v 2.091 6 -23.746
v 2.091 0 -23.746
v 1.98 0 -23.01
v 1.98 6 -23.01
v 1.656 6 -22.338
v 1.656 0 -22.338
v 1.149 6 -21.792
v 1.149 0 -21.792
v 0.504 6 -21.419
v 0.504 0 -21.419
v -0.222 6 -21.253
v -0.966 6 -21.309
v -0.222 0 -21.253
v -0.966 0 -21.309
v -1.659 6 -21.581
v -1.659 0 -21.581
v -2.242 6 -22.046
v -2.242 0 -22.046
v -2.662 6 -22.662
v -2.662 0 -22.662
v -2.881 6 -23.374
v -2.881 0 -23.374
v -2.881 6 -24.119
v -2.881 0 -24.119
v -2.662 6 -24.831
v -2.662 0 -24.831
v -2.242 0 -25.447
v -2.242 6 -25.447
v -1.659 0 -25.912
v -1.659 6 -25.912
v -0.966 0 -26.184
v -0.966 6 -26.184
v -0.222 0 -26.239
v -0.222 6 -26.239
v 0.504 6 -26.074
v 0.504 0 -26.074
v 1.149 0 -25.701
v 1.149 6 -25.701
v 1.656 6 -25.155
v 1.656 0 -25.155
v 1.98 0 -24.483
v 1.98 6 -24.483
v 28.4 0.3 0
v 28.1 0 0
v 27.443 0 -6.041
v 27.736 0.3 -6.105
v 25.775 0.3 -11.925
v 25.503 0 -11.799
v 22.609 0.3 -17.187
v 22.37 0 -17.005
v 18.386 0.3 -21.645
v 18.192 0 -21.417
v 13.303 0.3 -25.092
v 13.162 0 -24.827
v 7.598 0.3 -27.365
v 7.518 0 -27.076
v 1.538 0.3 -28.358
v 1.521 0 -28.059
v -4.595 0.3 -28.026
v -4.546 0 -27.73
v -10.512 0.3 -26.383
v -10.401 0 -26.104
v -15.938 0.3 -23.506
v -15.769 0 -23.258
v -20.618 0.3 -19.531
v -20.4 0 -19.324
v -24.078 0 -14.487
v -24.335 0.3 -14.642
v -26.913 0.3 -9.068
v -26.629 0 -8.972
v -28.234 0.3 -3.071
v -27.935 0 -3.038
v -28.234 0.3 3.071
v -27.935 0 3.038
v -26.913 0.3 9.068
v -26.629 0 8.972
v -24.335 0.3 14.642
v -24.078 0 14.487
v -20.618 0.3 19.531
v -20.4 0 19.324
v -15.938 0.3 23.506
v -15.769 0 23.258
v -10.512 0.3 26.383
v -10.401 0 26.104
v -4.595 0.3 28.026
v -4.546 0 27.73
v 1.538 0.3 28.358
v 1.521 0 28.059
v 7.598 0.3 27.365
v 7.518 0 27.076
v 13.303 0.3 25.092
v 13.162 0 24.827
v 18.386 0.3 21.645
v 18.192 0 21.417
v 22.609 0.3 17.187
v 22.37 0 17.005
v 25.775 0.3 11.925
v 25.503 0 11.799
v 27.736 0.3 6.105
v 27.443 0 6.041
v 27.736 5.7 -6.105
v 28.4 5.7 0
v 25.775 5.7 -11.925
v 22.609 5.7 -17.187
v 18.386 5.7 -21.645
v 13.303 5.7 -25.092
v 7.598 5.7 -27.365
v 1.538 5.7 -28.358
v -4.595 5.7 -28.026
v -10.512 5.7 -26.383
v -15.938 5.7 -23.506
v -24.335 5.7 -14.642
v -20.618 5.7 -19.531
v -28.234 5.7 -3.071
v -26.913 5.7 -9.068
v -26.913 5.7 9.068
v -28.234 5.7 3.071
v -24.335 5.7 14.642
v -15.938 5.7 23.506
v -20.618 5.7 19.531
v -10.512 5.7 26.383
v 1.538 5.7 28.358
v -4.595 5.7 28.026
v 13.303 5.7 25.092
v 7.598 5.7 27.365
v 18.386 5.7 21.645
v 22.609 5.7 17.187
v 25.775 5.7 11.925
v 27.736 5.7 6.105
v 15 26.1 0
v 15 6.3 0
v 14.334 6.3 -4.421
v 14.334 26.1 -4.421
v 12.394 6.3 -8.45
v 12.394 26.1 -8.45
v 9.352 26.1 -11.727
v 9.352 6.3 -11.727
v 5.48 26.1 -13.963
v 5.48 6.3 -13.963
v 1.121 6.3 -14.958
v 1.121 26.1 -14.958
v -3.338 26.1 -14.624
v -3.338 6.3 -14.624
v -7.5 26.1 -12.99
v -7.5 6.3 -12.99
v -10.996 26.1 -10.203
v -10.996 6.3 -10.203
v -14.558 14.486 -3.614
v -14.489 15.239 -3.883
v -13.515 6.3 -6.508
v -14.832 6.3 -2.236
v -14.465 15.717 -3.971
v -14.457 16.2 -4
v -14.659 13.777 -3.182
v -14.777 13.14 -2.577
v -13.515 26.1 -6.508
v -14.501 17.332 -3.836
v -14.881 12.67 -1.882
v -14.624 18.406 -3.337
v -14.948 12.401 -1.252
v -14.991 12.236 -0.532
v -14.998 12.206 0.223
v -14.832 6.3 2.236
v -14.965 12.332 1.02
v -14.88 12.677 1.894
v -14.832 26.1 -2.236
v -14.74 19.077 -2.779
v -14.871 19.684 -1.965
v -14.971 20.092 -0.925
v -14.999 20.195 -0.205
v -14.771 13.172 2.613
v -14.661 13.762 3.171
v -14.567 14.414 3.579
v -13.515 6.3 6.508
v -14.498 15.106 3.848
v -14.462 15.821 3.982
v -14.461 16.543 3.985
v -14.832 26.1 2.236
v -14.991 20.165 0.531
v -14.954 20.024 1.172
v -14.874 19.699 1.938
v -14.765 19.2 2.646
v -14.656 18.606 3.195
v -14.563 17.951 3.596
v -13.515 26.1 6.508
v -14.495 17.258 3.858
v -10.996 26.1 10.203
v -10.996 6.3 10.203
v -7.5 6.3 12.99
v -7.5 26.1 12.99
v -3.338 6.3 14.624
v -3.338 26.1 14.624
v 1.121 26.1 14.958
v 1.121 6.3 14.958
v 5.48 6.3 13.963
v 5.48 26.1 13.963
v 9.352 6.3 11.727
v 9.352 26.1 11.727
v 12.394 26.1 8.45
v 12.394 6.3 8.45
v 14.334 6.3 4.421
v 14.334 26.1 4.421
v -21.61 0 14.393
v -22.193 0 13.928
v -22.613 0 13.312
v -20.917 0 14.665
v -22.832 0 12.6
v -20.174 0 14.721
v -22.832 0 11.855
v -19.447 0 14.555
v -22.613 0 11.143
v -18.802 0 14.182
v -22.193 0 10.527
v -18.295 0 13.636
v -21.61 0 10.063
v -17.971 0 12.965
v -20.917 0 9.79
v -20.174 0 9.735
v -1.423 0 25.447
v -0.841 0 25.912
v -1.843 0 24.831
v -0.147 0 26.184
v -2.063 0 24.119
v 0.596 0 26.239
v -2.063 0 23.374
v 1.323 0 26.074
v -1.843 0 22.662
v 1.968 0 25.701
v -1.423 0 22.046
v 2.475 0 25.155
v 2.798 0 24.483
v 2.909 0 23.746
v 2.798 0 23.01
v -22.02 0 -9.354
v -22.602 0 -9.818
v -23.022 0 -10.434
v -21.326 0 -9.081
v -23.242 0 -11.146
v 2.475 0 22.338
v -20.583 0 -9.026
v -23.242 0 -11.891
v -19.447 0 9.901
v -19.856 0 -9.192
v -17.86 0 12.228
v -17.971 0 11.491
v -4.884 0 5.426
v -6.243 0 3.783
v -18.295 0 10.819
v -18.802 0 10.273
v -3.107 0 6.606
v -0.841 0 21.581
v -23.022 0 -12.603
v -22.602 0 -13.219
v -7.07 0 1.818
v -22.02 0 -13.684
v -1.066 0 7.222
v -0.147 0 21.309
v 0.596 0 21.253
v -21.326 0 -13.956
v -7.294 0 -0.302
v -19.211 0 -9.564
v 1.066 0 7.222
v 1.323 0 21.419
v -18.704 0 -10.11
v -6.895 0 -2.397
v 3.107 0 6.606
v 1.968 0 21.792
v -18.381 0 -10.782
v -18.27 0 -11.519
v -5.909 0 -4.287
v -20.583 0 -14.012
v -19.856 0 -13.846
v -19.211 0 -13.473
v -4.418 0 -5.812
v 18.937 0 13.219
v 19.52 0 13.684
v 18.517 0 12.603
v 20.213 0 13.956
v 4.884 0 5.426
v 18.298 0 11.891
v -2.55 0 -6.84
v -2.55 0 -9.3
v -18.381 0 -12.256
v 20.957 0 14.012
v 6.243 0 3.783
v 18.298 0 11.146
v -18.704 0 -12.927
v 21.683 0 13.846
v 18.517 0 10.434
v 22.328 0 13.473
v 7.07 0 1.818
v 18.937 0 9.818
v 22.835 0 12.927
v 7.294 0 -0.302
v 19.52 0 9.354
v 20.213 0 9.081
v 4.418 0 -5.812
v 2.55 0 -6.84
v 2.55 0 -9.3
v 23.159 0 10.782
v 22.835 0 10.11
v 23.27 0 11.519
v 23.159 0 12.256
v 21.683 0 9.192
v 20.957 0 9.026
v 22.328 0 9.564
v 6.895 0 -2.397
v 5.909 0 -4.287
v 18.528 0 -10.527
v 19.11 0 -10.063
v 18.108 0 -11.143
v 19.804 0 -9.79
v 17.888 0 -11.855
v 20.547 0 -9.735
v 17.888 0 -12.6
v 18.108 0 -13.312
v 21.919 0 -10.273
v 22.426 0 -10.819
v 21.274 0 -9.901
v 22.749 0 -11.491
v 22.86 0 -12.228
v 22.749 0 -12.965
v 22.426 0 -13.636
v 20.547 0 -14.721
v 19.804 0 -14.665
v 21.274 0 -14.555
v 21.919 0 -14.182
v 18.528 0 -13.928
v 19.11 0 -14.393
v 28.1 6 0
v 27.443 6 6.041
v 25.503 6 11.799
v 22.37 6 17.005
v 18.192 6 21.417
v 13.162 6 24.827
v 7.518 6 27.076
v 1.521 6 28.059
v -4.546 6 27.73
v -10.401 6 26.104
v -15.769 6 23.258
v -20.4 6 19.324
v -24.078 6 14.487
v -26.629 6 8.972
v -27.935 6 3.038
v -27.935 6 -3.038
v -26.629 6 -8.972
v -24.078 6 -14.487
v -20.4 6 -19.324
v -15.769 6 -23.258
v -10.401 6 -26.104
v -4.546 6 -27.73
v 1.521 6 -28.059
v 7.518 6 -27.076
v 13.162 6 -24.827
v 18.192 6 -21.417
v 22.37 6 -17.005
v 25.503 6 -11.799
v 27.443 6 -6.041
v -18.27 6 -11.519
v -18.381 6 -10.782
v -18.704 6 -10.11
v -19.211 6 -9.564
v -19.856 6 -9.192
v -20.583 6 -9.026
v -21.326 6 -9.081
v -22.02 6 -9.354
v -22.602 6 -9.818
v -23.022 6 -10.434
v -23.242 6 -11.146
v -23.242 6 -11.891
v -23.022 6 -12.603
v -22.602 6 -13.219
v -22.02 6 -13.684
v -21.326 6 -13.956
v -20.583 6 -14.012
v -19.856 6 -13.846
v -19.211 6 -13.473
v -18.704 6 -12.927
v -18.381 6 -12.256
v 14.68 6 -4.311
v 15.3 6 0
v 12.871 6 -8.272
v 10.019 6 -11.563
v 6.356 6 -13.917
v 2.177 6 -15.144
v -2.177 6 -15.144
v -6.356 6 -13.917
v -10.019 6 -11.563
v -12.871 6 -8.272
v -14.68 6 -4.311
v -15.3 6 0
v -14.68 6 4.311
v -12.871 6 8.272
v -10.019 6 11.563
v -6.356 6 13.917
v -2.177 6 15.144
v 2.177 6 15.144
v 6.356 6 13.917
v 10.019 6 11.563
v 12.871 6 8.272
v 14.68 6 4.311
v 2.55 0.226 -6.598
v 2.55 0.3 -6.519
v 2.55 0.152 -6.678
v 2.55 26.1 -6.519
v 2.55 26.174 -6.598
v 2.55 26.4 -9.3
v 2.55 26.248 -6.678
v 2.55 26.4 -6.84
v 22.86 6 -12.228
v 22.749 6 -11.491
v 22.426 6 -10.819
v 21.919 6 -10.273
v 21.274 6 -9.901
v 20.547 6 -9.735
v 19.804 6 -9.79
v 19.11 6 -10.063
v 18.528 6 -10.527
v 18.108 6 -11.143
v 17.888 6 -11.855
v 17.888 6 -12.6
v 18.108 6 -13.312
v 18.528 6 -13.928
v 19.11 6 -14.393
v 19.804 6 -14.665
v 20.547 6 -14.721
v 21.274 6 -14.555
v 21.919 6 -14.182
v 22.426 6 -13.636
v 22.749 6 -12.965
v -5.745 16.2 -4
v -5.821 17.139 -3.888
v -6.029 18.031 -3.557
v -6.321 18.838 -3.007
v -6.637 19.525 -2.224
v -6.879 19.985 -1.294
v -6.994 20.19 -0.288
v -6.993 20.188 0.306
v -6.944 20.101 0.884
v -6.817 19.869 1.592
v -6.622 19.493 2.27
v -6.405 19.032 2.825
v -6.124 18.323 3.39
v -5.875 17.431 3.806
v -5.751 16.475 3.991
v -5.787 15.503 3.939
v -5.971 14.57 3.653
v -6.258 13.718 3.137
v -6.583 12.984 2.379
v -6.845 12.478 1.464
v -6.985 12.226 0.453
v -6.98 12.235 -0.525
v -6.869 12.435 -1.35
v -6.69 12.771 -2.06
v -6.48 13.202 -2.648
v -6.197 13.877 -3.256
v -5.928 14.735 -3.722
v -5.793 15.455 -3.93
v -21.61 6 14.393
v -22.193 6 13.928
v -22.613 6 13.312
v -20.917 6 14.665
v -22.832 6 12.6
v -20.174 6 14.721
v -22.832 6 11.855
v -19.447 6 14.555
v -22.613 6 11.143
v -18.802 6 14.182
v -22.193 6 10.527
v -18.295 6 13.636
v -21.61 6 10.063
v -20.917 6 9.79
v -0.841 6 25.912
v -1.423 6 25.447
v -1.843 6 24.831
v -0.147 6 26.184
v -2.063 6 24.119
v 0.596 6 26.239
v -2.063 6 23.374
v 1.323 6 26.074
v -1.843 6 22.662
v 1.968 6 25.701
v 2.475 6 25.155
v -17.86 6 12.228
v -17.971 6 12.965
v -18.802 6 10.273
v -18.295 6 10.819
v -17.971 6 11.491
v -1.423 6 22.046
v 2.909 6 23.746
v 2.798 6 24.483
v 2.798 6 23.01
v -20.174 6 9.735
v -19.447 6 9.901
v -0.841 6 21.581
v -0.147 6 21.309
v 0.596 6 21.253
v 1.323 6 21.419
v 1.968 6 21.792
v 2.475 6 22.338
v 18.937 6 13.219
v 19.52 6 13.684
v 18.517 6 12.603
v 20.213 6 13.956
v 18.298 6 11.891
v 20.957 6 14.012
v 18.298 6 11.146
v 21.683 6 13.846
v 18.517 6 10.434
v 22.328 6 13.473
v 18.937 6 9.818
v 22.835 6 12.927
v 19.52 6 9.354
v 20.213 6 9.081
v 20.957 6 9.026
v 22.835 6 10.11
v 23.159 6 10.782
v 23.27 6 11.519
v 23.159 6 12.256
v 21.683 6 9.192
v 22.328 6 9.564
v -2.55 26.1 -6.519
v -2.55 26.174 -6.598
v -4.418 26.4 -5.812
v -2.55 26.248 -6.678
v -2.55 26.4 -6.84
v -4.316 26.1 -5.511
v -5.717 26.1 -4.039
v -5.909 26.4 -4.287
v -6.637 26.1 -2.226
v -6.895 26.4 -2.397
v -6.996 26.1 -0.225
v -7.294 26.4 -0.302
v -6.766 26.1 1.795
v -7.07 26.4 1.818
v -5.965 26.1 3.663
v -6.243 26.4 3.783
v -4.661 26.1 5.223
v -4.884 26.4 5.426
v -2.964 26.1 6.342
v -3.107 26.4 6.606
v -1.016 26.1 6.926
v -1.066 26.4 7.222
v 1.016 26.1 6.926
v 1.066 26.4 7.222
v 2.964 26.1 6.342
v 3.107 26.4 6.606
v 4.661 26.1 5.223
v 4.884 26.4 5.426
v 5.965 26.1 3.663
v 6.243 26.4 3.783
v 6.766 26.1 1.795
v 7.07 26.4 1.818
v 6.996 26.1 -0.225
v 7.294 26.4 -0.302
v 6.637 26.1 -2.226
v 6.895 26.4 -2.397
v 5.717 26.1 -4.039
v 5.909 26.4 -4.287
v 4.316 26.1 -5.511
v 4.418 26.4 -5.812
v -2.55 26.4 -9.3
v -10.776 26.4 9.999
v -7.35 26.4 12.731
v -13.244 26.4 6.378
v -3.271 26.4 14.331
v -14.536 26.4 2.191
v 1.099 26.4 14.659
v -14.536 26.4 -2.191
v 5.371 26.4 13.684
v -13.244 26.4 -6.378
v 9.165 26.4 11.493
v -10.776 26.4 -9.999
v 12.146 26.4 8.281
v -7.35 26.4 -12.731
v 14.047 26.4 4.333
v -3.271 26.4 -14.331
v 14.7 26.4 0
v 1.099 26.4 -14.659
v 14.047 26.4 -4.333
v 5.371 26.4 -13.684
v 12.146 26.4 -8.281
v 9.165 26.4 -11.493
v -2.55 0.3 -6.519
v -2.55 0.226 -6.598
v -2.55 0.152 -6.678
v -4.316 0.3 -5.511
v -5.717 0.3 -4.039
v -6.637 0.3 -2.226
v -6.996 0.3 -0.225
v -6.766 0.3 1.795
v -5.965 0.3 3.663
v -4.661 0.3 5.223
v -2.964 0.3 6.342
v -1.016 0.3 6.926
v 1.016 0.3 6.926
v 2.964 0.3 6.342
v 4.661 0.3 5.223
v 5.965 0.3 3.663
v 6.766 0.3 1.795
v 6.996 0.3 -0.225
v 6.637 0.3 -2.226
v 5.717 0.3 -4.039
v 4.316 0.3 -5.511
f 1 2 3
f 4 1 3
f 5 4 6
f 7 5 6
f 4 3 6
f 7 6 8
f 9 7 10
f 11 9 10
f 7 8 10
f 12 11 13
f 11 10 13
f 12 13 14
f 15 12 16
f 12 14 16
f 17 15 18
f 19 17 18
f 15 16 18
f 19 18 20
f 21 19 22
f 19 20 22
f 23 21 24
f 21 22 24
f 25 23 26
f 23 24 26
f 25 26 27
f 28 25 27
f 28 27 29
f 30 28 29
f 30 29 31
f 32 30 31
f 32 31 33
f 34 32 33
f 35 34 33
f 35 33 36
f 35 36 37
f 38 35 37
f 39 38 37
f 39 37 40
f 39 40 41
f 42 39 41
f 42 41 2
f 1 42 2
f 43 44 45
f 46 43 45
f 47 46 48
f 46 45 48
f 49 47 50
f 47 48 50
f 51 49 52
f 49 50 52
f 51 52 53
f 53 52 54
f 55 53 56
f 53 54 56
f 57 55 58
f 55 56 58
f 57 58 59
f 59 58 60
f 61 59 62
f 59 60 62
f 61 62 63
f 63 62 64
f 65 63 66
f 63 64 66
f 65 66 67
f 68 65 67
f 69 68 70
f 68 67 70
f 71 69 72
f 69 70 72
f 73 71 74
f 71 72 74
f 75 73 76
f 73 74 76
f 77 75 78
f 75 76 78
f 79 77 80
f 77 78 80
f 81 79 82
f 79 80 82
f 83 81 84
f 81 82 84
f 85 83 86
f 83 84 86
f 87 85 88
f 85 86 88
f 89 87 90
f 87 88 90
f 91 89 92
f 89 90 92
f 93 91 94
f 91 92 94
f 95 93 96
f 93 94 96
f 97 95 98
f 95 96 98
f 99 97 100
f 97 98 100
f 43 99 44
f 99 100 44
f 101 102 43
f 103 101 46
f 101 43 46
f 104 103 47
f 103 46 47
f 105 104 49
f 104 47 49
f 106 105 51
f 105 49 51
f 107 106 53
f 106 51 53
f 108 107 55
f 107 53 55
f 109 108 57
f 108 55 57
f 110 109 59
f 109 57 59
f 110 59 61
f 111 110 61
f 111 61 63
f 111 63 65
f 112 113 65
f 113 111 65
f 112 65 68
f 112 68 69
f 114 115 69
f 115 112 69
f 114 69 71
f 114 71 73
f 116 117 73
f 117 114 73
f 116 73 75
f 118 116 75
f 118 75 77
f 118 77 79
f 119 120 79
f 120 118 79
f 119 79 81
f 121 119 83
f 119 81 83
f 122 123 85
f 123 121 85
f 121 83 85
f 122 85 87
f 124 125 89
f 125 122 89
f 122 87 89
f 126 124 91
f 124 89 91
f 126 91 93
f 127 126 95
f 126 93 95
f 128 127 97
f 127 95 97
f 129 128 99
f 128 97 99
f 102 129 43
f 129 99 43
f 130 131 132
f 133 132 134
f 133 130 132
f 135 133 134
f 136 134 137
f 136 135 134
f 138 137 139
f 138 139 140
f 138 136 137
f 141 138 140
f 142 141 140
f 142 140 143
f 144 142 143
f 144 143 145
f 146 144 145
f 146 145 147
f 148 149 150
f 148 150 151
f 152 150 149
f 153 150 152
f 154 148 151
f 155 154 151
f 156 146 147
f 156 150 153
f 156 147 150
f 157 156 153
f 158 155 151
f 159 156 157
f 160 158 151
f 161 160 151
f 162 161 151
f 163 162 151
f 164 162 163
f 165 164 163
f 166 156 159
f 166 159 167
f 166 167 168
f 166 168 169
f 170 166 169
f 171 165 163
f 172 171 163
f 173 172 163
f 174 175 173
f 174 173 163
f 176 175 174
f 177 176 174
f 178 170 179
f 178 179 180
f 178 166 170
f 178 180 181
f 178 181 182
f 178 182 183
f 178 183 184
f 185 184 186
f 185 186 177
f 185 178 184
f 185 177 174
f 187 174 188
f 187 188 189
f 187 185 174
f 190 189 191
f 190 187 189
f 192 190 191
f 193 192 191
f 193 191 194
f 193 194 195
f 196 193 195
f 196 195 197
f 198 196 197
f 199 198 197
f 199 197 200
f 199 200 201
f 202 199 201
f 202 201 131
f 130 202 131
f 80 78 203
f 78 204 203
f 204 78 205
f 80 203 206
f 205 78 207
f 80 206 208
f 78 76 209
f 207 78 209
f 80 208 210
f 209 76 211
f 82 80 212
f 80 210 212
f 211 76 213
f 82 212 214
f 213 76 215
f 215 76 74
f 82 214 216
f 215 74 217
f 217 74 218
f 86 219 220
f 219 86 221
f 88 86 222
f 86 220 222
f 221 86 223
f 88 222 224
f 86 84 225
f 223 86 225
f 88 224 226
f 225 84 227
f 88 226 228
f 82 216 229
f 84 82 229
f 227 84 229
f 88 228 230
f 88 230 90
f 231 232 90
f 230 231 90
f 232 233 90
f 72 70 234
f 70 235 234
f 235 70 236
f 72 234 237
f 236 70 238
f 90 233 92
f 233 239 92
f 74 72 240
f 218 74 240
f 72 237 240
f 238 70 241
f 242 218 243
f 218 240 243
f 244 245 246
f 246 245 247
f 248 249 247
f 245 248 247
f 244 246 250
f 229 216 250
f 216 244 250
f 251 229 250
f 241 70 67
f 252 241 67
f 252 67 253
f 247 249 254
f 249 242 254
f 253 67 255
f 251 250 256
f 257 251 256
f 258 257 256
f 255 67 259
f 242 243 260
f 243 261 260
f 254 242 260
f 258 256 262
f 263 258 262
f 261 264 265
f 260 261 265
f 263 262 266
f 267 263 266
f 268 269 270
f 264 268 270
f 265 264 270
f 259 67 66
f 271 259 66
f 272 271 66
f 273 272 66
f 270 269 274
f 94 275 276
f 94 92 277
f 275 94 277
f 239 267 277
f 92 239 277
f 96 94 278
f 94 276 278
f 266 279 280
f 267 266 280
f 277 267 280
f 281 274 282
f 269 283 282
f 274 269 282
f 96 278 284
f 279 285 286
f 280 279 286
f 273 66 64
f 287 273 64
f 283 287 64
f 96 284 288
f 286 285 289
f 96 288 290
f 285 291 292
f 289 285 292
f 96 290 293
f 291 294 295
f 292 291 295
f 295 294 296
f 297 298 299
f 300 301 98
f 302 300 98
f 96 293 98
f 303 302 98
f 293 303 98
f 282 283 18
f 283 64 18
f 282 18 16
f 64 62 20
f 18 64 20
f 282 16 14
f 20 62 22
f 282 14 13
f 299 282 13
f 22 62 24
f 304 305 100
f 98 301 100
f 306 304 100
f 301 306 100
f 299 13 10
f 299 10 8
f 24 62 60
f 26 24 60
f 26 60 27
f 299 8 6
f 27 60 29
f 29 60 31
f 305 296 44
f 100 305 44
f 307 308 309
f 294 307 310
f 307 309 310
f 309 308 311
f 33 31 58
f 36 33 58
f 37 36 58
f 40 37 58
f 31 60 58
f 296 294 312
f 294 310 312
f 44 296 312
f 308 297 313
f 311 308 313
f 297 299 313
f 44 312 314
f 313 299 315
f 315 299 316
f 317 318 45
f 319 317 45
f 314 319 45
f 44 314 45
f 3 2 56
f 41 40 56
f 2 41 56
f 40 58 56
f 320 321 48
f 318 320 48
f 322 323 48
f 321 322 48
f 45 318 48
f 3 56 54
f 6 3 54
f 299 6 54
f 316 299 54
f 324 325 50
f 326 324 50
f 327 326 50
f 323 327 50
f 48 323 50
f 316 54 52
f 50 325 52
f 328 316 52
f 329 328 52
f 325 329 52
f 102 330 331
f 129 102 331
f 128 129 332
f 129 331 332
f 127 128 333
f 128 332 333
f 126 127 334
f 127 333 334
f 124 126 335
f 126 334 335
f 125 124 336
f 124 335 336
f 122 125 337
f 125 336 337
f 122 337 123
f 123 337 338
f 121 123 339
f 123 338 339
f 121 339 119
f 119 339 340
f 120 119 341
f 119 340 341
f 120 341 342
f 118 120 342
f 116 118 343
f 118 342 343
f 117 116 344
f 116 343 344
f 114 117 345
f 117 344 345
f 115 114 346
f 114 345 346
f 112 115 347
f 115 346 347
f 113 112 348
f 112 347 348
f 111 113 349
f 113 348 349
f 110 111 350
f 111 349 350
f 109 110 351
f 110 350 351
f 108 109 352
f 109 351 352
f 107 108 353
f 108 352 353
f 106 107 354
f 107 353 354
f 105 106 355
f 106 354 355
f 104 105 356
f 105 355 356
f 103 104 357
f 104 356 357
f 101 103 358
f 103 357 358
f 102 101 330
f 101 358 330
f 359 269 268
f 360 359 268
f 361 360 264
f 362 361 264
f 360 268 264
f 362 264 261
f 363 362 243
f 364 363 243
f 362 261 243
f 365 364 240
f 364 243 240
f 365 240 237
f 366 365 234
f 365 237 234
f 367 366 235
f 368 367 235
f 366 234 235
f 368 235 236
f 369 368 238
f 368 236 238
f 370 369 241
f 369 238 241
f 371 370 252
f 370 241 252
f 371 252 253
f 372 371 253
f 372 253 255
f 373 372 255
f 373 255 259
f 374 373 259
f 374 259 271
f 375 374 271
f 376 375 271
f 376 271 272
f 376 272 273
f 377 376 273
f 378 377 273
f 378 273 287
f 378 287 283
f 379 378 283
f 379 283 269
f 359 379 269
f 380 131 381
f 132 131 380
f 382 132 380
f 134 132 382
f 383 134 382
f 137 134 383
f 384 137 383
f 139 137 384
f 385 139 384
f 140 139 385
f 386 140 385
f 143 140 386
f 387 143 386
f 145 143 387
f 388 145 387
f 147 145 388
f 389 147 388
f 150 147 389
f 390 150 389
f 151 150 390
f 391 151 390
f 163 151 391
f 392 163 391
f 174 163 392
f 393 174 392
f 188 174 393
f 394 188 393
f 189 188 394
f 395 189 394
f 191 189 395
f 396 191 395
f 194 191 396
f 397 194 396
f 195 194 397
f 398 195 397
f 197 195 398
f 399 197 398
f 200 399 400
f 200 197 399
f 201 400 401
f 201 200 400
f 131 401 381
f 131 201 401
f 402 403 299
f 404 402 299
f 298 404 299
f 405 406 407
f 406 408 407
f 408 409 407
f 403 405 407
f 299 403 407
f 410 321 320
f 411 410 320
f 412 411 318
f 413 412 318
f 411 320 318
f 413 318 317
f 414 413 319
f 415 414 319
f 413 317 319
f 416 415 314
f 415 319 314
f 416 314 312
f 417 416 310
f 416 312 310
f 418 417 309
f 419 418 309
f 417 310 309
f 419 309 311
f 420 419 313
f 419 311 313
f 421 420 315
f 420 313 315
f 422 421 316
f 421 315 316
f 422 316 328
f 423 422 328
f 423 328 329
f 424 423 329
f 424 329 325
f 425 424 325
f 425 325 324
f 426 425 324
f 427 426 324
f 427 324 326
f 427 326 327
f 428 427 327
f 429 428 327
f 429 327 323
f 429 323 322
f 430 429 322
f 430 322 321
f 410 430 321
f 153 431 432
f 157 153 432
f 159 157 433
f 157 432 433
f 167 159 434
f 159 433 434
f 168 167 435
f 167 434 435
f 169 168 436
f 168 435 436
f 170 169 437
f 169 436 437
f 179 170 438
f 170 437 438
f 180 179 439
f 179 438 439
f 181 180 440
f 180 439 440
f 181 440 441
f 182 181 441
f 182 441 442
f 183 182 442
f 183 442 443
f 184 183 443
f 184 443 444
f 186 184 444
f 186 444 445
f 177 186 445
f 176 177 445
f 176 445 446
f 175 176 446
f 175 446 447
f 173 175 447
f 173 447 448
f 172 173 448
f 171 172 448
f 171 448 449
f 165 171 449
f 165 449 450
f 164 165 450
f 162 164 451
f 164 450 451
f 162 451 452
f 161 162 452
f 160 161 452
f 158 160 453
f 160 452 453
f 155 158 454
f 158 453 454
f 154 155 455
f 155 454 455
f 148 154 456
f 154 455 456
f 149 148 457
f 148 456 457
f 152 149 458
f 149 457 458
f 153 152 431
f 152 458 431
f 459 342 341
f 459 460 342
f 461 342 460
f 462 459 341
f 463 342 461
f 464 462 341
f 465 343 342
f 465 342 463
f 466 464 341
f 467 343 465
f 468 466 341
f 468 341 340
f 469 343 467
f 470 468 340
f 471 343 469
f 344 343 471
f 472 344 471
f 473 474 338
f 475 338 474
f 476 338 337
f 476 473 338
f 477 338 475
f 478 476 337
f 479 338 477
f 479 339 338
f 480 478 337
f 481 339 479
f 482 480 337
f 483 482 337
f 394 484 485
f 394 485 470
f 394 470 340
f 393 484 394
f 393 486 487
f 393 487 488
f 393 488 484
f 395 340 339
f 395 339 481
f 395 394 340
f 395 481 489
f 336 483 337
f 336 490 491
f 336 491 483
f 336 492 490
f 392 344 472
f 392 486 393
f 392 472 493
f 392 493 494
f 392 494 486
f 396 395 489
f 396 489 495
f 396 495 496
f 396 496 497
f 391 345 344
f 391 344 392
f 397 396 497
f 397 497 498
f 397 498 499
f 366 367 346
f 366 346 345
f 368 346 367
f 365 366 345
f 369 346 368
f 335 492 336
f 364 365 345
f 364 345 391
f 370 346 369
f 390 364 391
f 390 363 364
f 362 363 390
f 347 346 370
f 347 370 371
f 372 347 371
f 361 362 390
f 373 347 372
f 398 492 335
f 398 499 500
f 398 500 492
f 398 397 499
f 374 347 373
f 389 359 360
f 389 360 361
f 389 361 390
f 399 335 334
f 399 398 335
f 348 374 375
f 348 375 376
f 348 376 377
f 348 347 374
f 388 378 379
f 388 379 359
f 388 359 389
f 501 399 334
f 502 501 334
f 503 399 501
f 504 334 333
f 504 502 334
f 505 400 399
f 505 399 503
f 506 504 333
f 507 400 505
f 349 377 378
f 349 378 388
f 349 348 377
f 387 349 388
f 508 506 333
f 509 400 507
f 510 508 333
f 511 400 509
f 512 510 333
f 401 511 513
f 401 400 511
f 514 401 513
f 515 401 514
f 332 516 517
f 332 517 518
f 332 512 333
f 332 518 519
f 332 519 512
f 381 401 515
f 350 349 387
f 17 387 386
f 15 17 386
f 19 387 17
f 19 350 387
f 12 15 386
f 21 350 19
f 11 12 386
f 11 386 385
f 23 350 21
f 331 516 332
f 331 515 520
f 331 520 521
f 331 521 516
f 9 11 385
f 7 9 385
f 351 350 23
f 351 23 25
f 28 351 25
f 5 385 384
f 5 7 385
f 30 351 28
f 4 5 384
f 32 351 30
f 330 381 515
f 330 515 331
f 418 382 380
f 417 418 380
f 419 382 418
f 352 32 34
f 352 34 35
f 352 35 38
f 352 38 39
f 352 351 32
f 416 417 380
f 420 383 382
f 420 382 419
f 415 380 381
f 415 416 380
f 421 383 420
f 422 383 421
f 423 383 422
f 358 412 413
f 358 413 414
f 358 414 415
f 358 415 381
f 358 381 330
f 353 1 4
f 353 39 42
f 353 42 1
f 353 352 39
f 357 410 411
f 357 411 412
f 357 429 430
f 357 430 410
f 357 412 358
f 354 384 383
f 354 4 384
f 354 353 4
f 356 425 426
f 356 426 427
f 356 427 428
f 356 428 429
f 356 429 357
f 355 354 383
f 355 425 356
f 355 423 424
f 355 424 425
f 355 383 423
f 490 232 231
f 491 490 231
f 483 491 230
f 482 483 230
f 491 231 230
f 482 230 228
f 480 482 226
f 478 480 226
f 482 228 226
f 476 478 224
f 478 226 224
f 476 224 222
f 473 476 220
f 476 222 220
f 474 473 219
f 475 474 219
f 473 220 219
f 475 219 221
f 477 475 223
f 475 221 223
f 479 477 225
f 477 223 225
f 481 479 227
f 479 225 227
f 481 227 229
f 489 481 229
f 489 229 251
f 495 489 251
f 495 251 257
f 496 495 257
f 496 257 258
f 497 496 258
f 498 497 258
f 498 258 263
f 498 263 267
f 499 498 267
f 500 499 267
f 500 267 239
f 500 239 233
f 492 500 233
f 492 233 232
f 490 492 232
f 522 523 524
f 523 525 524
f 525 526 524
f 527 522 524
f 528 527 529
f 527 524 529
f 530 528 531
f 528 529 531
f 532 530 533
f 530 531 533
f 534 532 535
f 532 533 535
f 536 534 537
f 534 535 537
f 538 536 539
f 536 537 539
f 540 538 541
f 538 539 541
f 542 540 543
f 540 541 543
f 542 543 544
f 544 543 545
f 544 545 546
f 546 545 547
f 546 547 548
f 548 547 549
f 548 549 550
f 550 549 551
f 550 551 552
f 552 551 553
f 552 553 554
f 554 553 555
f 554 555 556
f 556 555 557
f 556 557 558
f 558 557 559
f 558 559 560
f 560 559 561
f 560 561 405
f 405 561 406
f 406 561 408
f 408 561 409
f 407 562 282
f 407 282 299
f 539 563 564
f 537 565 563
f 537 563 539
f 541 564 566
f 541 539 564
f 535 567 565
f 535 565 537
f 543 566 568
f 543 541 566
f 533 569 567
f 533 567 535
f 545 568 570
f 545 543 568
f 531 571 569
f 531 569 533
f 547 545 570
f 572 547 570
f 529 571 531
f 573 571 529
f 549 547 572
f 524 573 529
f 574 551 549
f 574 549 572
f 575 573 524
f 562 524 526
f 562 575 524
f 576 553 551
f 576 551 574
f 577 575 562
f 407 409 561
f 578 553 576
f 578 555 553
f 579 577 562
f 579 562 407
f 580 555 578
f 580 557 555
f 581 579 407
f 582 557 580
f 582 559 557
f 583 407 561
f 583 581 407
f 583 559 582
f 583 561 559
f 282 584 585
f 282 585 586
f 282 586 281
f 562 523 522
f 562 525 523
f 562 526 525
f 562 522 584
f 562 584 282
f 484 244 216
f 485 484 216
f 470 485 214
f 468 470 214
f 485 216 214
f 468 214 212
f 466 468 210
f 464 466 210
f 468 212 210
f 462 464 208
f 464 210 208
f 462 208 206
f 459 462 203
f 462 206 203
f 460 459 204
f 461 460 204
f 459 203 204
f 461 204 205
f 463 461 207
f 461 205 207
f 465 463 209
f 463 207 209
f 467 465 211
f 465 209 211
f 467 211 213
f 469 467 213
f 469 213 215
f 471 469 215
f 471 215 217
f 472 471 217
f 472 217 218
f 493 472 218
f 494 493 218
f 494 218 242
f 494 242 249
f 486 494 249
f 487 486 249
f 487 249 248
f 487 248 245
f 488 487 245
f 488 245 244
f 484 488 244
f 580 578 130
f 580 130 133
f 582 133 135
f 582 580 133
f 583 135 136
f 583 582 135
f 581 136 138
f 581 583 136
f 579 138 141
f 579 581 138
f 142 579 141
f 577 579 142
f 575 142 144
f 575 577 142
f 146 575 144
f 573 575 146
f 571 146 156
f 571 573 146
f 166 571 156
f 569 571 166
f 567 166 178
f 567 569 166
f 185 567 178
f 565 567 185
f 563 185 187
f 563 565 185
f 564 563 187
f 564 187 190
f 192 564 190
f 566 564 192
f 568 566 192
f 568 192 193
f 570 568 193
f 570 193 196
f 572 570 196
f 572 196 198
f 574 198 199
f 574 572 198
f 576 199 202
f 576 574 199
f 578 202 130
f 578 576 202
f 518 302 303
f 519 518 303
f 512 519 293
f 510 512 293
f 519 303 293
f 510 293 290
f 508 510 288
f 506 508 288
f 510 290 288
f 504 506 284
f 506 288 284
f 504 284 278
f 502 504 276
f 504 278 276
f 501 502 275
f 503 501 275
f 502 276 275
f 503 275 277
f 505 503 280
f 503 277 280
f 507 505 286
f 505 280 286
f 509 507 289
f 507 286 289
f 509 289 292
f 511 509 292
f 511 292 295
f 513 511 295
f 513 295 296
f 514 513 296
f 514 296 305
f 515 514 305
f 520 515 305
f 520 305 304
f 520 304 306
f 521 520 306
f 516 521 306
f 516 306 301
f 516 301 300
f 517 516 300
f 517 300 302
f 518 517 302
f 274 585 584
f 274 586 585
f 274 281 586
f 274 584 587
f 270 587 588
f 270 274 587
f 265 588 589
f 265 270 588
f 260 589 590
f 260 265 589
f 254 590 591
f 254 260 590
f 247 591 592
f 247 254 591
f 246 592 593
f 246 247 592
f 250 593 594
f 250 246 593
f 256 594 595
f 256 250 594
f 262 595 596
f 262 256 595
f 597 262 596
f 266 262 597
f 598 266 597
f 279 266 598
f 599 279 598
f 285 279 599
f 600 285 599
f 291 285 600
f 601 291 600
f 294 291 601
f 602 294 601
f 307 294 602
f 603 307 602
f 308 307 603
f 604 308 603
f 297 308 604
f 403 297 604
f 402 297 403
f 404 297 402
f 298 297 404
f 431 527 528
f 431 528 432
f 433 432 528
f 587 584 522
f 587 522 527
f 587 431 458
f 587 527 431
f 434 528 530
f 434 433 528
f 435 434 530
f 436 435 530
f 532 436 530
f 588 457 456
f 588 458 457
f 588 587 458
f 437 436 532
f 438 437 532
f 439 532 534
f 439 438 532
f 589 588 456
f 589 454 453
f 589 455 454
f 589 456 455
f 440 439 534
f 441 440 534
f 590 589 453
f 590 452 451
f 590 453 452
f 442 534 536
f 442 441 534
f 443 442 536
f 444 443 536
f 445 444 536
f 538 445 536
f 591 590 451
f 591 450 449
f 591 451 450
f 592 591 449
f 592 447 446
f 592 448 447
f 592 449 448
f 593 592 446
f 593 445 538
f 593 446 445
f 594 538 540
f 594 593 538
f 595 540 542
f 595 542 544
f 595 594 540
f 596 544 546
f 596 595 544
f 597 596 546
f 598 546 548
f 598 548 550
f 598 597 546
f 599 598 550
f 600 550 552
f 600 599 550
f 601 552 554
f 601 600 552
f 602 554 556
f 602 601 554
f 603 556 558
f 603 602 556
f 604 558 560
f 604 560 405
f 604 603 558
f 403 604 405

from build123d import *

# Parameters (mm, degrees)
ESQUISSE1_R             = 28.4
ESQUISSE1_R_2           = 7
BOSS_EXTRU_1_DEPTH      = 26.4
ESQUISSE2_OUTSIDE_W     = 75.71
ESQUISSE2_OUTSIDE_H     = 75.71
ESQUISSE2_OUTSIDE_R     = 15
ENL_V_MAT_EXTRU_1_DEPTH = 20.4
ESQUISSE3_R             = 2.5
ENL_V_MAT_EXTRU_2_DEPTH = 27.4
ENL_V_MAT_EXTRU_3_REACH = 30.4
ESQUISSE4_R             = 4
ESQUISSE5_W             = 5.1
ESQUISSE5_H             = 9.3
ENL_V_MAT_EXTRU_4_DEPTH = 27.4000001
CHANFREIN1_SIZE         = 0.3


with BuildPart() as part:
    # Esquisse1 → Boss.-Extru.1 (new body)
    with BuildSketch(Plane(origin=(0, 0, 0), x_dir=(1, 0, 0), z_dir=(0, 1, 0))):
        Circle(ESQUISSE1_R)
        Circle(ESQUISSE1_R_2, mode=Mode.SUBTRACT)
    extrude(amount=BOSS_EXTRU_1_DEPTH)

    # Esquisse2 outside → Enlèv. mat.-Extru.1 (cut)
    with BuildSketch(Plane(origin=(0, 26.4, 0), x_dir=(1, 0, 0), z_dir=(0, 1, 0))):
        Rectangle(ESQUISSE2_OUTSIDE_W, ESQUISSE2_OUTSIDE_H)
        Circle(ESQUISSE2_OUTSIDE_R, mode=Mode.SUBTRACT)
    extrude(amount=-ENL_V_MAT_EXTRU_1_DEPTH, mode=Mode.SUBTRACT)

    # Esquisse3 → Enlèv. mat.-Extru.2 (cut, through all)
    with BuildSketch(Plane.XZ):
        with Locations((0.409323167, 23.746472465)):
            Circle(ESQUISSE3_R)
        with Locations((20.769709989, 11.518751972)):
            Circle(ESQUISSE3_R)
        with Locations((20.360386822, -12.227720494)):
            Circle(ESQUISSE3_R)
        with Locations((-0.409323167, -23.746472465)):
            Circle(ESQUISSE3_R)
        with Locations((-20.769709989, -11.518751972)):
            Circle(ESQUISSE3_R)
        with Locations((-20.360386822, 12.227720494)):
            Circle(ESQUISSE3_R)
    extrude(amount=-ENL_V_MAT_EXTRU_2_DEPTH, mode=Mode.SUBTRACT)

    # Esquisse4 → Enlèv. mat.-Extru.3 (cut, up to next)
    with BuildSketch(Plane(origin=(0, 0, 0), x_dir=(0, 0, -1), z_dir=(1, 0, 0)), mode=Mode.PRIVATE) as enl_v_mat_extru_3_sk1:
        with Locations((0, 16.2)):
            Circle(ESQUISSE4_R)
    enl_v_mat_extru_3_tool1 = extrude(enl_v_mat_extru_3_sk1.sketch, amount=-ENL_V_MAT_EXTRU_3_REACH, mode=Mode.PRIVATE) & part.part
    add(enl_v_mat_extru_3_tool1.solids().sort_by_distance((0, 16.2, 0))[0], mode=Mode.SUBTRACT)

    # Esquisse5 → Enlèv. mat.-Extru.4 (cut, through all)
    with BuildSketch(Plane(origin=(0, 26.4, 0), x_dir=(1, 0, 0), z_dir=(0, 1, 0))):
        with Locations((0, 4.65)):
            Rectangle(ESQUISSE5_W, ESQUISSE5_H)
    extrude(amount=-ENL_V_MAT_EXTRU_4_DEPTH, mode=Mode.SUBTRACT)

    # Chanfrein1
    chanfrein1_edges = [part.edges().sort_by_distance(p)[0] for p in [
        (-15, 6, 0),
        (-15, 26.4, 0),
        (-28.4, 6, 0),
        (-28.4, 0, 0),
        (0, 26.4, 7),
        (0, 0, 7),
    ]]
    chamfer(chanfrein1_edges, length=CHANFREIN1_SIZE)


solid = part.part
